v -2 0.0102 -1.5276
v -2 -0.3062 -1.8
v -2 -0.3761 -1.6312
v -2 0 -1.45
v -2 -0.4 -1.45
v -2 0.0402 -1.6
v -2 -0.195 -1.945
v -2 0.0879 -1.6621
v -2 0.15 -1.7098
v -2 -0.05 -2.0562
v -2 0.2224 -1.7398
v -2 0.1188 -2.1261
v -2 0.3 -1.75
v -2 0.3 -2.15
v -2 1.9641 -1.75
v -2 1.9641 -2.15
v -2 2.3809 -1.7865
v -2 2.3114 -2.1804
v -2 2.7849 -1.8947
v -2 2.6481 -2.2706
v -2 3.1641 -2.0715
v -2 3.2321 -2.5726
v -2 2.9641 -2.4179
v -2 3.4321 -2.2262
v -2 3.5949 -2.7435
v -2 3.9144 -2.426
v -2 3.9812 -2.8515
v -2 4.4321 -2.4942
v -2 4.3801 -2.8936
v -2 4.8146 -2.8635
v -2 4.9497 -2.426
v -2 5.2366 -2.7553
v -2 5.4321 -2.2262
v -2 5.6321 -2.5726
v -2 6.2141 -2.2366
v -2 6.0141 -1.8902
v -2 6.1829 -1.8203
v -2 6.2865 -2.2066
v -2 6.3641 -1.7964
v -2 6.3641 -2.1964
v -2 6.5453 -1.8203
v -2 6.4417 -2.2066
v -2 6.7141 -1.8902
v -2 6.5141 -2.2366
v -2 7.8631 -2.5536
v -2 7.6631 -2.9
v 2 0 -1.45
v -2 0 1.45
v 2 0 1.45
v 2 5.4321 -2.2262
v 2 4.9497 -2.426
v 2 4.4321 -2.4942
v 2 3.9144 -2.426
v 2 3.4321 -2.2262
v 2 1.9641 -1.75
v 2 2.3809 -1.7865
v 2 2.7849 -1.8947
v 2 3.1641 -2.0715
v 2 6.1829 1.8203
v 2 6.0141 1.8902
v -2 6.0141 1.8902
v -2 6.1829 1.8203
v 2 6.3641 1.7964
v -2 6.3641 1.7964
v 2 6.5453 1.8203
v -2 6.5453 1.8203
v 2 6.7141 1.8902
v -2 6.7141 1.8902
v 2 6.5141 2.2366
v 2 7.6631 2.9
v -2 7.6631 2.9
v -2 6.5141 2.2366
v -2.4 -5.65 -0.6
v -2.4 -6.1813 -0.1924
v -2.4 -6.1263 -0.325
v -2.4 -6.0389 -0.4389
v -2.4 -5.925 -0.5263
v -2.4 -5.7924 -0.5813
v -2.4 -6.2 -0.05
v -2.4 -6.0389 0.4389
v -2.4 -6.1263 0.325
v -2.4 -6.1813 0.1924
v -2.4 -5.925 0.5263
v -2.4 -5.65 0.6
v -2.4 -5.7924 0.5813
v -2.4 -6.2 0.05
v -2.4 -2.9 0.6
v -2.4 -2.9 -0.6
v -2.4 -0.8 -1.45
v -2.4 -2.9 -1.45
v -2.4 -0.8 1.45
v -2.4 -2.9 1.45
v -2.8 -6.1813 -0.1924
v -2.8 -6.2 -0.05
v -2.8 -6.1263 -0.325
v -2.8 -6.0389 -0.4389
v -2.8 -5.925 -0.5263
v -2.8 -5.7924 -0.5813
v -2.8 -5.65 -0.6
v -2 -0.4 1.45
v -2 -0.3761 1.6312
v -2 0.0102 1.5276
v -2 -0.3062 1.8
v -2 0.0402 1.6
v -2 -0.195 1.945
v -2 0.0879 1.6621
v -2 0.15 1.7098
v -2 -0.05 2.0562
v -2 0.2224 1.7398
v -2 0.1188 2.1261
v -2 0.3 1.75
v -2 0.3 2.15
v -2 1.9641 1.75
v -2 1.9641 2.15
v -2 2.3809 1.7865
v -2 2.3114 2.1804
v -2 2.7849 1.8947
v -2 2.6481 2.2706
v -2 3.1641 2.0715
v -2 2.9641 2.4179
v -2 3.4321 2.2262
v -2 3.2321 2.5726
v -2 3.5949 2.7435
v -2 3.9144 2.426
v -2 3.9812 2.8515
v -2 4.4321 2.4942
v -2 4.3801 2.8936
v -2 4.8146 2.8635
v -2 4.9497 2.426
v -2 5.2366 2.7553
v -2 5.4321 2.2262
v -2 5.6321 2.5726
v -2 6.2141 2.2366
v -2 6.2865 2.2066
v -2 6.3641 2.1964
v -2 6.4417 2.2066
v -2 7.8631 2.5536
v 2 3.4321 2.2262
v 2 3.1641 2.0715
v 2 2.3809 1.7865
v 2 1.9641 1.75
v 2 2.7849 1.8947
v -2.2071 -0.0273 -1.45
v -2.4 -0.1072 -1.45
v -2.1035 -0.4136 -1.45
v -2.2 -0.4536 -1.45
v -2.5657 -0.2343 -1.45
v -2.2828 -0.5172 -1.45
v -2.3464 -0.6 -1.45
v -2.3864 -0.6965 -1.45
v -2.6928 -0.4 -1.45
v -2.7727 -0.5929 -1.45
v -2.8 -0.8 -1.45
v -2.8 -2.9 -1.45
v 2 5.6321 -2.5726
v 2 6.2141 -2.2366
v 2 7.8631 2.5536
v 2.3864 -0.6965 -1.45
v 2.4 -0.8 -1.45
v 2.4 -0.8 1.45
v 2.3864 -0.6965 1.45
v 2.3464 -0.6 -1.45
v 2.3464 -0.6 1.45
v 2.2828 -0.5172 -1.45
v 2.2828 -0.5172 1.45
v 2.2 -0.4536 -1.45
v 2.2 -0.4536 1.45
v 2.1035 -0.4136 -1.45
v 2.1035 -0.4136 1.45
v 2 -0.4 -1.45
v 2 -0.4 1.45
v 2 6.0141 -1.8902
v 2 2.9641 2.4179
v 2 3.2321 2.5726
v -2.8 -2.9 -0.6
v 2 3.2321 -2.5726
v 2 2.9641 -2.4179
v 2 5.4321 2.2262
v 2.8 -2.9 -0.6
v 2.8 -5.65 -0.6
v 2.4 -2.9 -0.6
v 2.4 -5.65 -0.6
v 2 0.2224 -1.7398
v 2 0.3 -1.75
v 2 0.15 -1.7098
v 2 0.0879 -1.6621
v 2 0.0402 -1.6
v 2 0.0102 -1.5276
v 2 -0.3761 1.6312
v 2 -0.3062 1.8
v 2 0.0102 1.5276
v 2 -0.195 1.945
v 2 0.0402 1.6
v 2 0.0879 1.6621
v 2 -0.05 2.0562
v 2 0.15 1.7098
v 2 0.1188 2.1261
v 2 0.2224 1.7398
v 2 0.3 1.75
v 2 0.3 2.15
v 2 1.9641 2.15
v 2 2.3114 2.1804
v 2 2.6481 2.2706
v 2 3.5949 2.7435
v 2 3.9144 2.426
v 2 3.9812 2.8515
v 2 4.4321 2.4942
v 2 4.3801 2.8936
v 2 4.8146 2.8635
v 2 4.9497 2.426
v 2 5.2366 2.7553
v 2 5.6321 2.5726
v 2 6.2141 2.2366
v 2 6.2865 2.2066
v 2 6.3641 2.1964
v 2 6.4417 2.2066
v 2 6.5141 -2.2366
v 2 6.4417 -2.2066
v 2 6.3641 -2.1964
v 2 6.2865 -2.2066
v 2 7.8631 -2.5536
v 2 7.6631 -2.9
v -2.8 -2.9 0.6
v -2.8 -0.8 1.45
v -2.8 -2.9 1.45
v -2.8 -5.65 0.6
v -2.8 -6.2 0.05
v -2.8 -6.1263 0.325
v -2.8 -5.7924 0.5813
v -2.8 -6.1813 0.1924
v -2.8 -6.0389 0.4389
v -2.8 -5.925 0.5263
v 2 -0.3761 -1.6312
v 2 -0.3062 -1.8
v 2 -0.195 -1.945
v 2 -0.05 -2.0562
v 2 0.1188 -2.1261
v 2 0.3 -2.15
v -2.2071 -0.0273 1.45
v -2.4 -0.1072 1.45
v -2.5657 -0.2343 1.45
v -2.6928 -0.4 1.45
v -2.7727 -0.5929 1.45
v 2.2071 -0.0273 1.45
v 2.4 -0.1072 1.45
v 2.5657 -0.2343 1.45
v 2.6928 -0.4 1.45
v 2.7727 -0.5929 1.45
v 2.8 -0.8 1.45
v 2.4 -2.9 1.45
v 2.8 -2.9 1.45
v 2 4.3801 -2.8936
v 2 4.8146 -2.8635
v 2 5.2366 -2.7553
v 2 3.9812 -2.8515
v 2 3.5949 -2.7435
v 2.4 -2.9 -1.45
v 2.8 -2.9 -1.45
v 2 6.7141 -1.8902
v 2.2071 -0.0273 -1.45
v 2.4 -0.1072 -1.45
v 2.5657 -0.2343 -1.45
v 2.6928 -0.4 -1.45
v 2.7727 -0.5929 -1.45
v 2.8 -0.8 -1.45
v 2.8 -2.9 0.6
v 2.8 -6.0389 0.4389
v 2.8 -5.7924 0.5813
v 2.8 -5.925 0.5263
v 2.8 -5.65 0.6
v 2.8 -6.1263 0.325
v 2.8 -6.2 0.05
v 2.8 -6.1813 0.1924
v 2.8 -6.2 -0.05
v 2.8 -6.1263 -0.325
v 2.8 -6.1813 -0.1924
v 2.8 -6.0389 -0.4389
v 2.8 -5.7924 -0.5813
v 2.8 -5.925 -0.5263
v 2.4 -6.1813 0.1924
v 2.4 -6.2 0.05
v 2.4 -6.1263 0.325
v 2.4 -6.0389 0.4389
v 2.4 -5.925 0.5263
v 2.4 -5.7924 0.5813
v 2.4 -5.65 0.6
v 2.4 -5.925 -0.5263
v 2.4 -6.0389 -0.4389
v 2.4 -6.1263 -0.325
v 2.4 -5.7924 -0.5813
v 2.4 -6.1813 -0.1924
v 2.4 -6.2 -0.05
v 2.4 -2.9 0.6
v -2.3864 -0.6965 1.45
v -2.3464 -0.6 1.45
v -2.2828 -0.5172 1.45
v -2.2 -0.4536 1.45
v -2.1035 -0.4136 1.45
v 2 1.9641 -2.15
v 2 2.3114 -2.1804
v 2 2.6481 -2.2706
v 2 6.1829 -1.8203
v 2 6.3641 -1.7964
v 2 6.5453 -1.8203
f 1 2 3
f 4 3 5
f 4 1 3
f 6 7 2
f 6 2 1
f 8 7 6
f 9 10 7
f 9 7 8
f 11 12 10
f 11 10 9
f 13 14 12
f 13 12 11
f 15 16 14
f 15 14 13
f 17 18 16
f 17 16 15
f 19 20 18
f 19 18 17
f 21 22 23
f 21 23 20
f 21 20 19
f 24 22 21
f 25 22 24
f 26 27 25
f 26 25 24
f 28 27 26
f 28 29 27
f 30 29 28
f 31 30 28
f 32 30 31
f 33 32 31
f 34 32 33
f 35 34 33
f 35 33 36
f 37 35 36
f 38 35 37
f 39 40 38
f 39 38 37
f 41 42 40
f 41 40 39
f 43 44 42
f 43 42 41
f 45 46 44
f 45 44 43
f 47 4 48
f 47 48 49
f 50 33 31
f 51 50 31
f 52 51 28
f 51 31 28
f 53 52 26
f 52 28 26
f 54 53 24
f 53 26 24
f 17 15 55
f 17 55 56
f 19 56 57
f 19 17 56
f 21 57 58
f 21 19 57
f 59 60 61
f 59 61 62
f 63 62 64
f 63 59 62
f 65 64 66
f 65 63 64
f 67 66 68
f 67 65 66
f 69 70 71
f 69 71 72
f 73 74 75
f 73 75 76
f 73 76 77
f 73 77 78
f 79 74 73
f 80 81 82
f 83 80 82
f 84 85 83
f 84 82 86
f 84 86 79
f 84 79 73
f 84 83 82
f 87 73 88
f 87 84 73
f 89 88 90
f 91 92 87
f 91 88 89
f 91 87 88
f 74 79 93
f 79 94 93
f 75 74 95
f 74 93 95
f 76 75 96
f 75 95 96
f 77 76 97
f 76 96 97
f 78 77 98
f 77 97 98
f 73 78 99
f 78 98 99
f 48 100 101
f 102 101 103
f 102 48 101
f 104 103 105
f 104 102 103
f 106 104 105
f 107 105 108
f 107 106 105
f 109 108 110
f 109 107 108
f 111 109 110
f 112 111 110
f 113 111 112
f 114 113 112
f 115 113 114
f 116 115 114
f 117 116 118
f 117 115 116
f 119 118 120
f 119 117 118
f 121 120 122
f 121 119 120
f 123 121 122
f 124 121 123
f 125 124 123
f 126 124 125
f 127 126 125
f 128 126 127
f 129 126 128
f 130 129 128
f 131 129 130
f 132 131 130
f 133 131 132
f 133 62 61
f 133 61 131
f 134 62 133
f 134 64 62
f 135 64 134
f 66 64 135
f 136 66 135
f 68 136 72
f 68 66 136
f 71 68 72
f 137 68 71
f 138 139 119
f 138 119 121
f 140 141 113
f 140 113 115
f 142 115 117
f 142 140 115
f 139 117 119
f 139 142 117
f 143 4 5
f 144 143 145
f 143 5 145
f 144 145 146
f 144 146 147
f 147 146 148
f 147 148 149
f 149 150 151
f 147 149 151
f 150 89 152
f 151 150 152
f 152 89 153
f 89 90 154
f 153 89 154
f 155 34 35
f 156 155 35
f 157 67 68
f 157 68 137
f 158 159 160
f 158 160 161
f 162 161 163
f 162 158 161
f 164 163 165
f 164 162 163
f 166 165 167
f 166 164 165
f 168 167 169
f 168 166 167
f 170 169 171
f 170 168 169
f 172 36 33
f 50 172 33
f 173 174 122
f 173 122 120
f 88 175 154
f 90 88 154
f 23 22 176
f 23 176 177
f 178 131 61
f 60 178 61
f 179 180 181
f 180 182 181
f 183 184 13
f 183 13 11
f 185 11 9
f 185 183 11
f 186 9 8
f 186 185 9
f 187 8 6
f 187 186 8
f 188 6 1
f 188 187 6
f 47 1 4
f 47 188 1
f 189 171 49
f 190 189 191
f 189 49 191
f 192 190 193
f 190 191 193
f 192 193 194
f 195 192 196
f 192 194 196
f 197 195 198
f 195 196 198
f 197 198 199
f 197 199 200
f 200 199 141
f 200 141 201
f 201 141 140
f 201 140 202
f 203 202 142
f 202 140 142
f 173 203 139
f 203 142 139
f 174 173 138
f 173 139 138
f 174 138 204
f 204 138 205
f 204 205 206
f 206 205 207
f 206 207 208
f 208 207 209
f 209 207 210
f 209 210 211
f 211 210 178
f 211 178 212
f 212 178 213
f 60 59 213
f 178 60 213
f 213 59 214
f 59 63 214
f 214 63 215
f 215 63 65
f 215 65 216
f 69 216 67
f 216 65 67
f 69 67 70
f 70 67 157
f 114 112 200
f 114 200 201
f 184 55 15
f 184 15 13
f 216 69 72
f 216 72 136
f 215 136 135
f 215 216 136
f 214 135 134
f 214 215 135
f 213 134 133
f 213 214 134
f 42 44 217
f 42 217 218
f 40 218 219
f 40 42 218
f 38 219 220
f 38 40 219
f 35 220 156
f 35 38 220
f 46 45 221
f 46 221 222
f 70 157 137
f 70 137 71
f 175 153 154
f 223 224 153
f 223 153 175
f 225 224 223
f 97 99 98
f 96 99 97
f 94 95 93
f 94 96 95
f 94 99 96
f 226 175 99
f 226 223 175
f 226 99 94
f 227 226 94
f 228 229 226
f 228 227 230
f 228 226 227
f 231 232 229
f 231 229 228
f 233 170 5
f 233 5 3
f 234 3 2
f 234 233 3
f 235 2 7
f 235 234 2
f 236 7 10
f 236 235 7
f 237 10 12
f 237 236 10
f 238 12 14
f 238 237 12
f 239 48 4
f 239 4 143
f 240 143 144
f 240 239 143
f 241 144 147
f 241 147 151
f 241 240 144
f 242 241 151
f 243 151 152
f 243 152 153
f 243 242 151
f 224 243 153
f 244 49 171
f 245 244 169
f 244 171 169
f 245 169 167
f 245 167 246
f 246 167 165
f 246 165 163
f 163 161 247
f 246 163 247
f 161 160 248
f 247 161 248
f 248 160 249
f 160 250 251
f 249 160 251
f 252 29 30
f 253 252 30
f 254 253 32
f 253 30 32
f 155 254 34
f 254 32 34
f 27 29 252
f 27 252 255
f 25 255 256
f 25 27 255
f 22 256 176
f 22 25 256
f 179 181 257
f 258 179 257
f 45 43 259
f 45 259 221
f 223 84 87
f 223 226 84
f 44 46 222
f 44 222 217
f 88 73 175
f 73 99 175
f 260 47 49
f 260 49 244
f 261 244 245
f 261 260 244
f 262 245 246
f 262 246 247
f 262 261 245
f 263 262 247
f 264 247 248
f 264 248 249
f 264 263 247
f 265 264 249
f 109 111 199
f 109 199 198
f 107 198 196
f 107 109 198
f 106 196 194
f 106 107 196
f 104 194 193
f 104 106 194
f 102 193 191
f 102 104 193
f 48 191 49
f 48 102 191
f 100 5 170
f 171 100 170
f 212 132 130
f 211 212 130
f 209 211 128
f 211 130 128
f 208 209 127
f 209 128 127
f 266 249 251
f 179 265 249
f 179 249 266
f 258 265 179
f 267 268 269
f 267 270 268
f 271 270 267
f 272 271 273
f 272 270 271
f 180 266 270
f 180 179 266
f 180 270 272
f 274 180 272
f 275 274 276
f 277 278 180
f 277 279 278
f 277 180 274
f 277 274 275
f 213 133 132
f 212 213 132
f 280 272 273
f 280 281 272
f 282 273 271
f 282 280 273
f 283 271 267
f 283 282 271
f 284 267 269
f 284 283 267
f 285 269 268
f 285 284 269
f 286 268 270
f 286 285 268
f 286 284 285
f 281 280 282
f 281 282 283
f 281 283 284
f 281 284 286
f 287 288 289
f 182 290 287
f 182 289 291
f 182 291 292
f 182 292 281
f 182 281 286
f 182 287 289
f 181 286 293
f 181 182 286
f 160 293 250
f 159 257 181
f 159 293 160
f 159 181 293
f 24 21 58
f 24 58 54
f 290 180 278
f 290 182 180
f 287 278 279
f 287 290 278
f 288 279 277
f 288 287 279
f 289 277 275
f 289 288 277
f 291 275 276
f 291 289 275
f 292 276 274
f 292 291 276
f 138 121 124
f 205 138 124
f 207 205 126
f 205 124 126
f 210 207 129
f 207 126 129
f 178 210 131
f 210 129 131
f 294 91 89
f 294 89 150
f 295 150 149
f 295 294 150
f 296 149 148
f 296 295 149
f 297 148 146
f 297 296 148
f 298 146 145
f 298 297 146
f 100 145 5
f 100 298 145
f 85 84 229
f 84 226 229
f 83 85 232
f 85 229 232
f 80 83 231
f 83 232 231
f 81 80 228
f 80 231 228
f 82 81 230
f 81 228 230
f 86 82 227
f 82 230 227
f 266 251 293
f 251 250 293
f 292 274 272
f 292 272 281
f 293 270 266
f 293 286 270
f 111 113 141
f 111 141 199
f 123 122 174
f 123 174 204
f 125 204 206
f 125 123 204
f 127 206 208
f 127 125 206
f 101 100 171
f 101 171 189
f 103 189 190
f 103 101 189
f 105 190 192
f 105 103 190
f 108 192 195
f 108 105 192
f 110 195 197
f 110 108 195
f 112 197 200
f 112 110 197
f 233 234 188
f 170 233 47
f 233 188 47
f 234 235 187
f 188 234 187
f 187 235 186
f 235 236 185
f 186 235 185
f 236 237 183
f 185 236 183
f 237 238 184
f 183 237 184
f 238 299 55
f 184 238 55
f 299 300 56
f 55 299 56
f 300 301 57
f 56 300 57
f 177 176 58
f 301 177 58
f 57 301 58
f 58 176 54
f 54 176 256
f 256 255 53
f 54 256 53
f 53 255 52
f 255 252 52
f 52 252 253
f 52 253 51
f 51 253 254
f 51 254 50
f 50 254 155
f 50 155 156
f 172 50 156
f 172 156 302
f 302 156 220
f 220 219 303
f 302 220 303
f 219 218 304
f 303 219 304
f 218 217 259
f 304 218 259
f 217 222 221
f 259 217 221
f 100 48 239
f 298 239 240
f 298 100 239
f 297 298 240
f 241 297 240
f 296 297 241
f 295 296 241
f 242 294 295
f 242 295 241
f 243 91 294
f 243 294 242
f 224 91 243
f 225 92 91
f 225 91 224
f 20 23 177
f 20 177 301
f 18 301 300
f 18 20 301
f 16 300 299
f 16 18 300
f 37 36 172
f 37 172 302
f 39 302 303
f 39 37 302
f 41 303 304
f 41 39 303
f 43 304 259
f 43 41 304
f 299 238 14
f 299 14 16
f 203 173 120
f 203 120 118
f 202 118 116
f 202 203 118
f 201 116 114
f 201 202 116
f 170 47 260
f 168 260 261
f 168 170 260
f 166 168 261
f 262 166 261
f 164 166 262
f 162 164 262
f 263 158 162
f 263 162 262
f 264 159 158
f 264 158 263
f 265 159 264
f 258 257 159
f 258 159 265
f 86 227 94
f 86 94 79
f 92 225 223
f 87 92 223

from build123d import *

# Parameters (mm, degrees)
SKETCH_1_W                         = 4
SKETCH_1_H                         = 3.5
SM_BASE_FLANGE_1_DEPTH             = 0.4
SM_EDGE_FLANGE_1_STRIP_W           = 2.2
SM_EDGE_FLANGE_1_STRIP_H           = 0.4
SM_EDGE_FLANGE_1_STRIP_CUT_DEPTH   = 4
SM_EDGE_FLANGE_1_STRIP_2_W         = 2.2
SM_EDGE_FLANGE_1_STRIP_2_H         = 0.4
SM_EDGE_FLANGE_1_STRIP_CUT_2_DEPTH = 4
SM_EDGE_FLANGE_1_DEPTH             = 4
SM_EDGE_FLANGE_1_BEND_DEPTH        = 4
SM_EDGE_FLANGE_2_STRIP_CUT_DEPTH   = 4
SM_EDGE_FLANGE_2_STRIP_CUT_2_DEPTH = 4
SM_EDGE_FLANGE_2_DEPTH             = 4
SM_EDGE_FLANGE_2_BEND_DEPTH        = 4
SM_START                           = -2
SM_EDGE_FLANGE_3_DEPTH             = 4
SM_EDGE_FLANGE_3_2_DEPTH           = 4
SM_EDGE_FLANGE_4_STRIP_CUT_DEPTH   = 4
SM_EDGE_FLANGE_4_STRIP_CUT_2_DEPTH = 4
SM_EDGE_FLANGE_4_DEPTH             = 4
SM_EDGE_FLANGE_4_BEND_DEPTH        = 4
SM_EDGE_FLANGE_5_DEPTH             = 2.9
SM_EDGE_FLANGE_5_BEND_DEPTH        = 2.9
CUT_EXTRUDE_1_DEPTH                = 10
CUT_EXTRUDE_1_DEPTH_BACK           = 10
SKETCH_36_W                        = 1.707463823
SKETCH_36_H                        = 4.810050527
SKETCH_36_W_2                      = 1.878862713
FILLET_1_R                         = 0.55


# Read off the part's stored shape, not the designer's step: Ребро-кромка3
# Sheet-metal steps are written as plain solids
with BuildPart() as part:
    # Sketch 1 → Базовая кромка1 (new body)
    with BuildSketch(Plane(origin=(0, 0, 0), x_dir=(1, 0, 0), z_dir=(0, 1, 0))):
        Rectangle(SKETCH_1_W, SKETCH_1_H)
    extrude(amount=-SM_BASE_FLANGE_1_DEPTH)

    # Ребро-кромка1 strip (across the edge) → Ребро-кромка1 strip cut (cut)
    with BuildSketch(Plane(origin=(-2, 0, 1.75), x_dir=(0, 0, -1), z_dir=(1, 0, 0))):
        with Locations((-0.8, -0.2)):
            Rectangle(SM_EDGE_FLANGE_1_STRIP_W, SM_EDGE_FLANGE_1_STRIP_H)
    extrude(amount=SM_EDGE_FLANGE_1_STRIP_CUT_DEPTH, mode=Mode.SUBTRACT)

    # Ребро-кромка1 strip 2 (across the edge) → Ребро-кромка1 strip cut 2 (cut)
    with BuildSketch(Plane(origin=(2, 0, -1.75), x_dir=(0, 0, 1), z_dir=(-1, 0, 0))):
        with Locations((-0.8, -0.2)):
            Rectangle(SM_EDGE_FLANGE_1_STRIP_2_W, SM_EDGE_FLANGE_1_STRIP_2_H)
    extrude(amount=SM_EDGE_FLANGE_1_STRIP_CUT_2_DEPTH, mode=Mode.SUBTRACT)

    # Ребро-кромка1 section (across the edge) → Ребро-кромка1 (add)
    with BuildSketch(Plane(origin=(-2, 0, 1.75), x_dir=(0, 0, -1), z_dir=(1, 0, 0))):
        with BuildLine():
            Line((-0.4, 0.3), (-0.4, 2.5))
            Line((-0.4, 2.5), (0, 2.5))
            Line((0, 2.5), (0, 0.3))
            ThreePointArc((0, 0.3), (0.087867966, 0.087867966), (0.3, 0))
            Line((0.3, 0), (0.3, -0.4))
            ThreePointArc((0.3, -0.4), (-0.194974747, -0.194974747), (-0.4, 0.3))
        make_face()
    extrude(amount=SM_EDGE_FLANGE_1_DEPTH)

    # Ребро-кромка1 section 2 (across the edge) → Ребро-кромка1 bend (add)
    with BuildSketch(Plane(origin=(2, 0, -1.75), x_dir=(0, 0, 1), z_dir=(-1, 0, 0))):
        with BuildLine():
            Line((-0.4, 0.3), (-0.4, 2.5))
            Line((-0.4, 2.5), (0, 2.5))
            Line((0, 2.5), (0, 0.3))
            ThreePointArc((0, 0.3), (0.087867966, 0.087867966), (0.3, 0))
            Line((0.3, 0), (0.3, -0.4))
            ThreePointArc((0.3, -0.4), (-0.194974747, -0.194974747), (-0.4, 0.3))
        make_face()
    extrude(amount=SM_EDGE_FLANGE_1_BEND_DEPTH)

    # Ребро-кромка2 strip (across the edge) → Ребро-кромка2 strip cut (cut)
    with BuildSketch(Plane(origin=(2, 2.5, 2.15), x_dir=(0, -0.49999999999999795, 0.8660254037844398), z_dir=(-1, 0, 0))):
        Polygon((-2.878460969, 4.185640646), (-0.078460969, -0.664101615), (0.267949192, -0.464101615), (-2.532050808, 4.385640646), align=None)
    extrude(amount=SM_EDGE_FLANGE_2_STRIP_CUT_DEPTH, mode=Mode.SUBTRACT)

    # Ребро-кромка2 strip 2 (across the edge) → Ребро-кромка2 strip cut 2 (cut)
    with BuildSketch(Plane(origin=(-2, 2.5, -2.15), x_dir=(0, -0.49999999999999495, -0.8660254037844416), z_dir=(1, 0, 0))):
        Polygon((-2.878460969, 4.185640646), (-0.078460969, -0.664101615), (0.267949192, -0.464101615), (-2.532050808, 4.385640646), align=None)
    extrude(amount=SM_EDGE_FLANGE_2_STRIP_CUT_2_DEPTH, mode=Mode.SUBTRACT)

    # Ребро-кромка2 section (across the edge) → Ребро-кромка2 (add)
    with BuildSketch(Plane(origin=(2, 2.5, 2.15), x_dir=(0, -0.49999999999999795, 0.8660254037844398), z_dir=(-1, 0, 0))):
        with BuildLine():
            Line((-0.4, 0.535898385), (-0.4, 2))
            Line((-0.4, 2), (0, 2))
            Line((0, 2), (0, 0.535898385))
            ThreePointArc((0, 0.535898385), (0.068148347, 0.018260295), (0.267949192, -0.464101615))
            Line((0.267949192, -0.464101615), (-0.078460969, -0.664101615))
            ThreePointArc((-0.078460969, -0.664101615), (-0.318221983, -0.085267323), (-0.4, 0.535898385))
        make_face()
    extrude(amount=SM_EDGE_FLANGE_2_DEPTH)

    # Ребро-кромка2 section 2 (across the edge) → Ребро-кромка2 bend (add)
    with BuildSketch(Plane(origin=(-2, 2.5, -2.15), x_dir=(0, -0.49999999999999495, -0.8660254037844416), z_dir=(1, 0, 0))):
        with BuildLine():
            Line((-0.4, 0.535898385), (-0.4, 2))
            Line((-0.4, 2), (0, 2))
            Line((0, 2), (0, 0.535898385))
            ThreePointArc((0, 0.535898385), (0.068148347, 0.018260295), (0.267949192, -0.464101615))
            Line((0.267949192, -0.464101615), (-0.078460969, -0.664101615))
            ThreePointArc((-0.078460969, -0.664101615), (-0.318221983, -0.085267323), (-0.4, 0.535898385))
        make_face()
    extrude(amount=SM_EDGE_FLANGE_2_BEND_DEPTH)

    # Ребро-кромка3 outline → Ребро-кромка3 (cut)
    with BuildSketch(Plane.YZ.offset(SM_START)):
        with BuildLine():
            ThreePointArc((3.232050808, 2.572649731), (3.785814556, 2.80554739), (4.380068552, 2.893625747))
            Line((4.380068552, 2.893625747), (4.232050808, 3.15))
            Line((4.232050808, 3.15), (3.232050808, 2.572649731))
        make_face()
        with BuildLine():
            Line((4.232050808, -3.15), (4.380068552, -2.893625747))
            ThreePointArc((4.380068552, -2.893625747), (3.785814556, -2.80554739), (3.232050808, -2.572649731))
            Line((3.232050808, -2.572649731), (4.232050808, -3.15))
        make_face()
    extrude(amount=SM_EDGE_FLANGE_3_DEPTH, mode=Mode.SUBTRACT)

    # Sm Edge Flange 3 2 outline → Sm Edge Flange 3 2 (add)
    with BuildSketch(Plane.YZ.offset(SM_START)):
        with BuildLine():
            Line((6.364101615, 2.15), (5.632050808, 2.572649731))
            ThreePointArc((5.632050808, 2.572649731), (5.028073111, 2.819002177), (4.380068552, 2.893625747))
            Line((4.380068552, 2.893625747), (4.432050808, 2.803589838))
            Line((4.432050808, 2.803589838), (3.432050808, 2.226239569))
            ThreePointArc((3.432050808, 2.226239569), (4.432050808, 2.494188762), (5.432050808, 2.226239569))
            Line((5.432050808, 2.226239569), (6.164101615, 1.803589838))
            Line((6.164101615, 1.803589838), (6.364101615, 2.15))
        make_face()
        with BuildLine():
            ThreePointArc((4.380068552, -2.893625747), (5.028073111, -2.819002177), (5.632050808, -2.572649731))
            Line((5.632050808, -2.572649731), (6.364101615, -2.15))
            Line((6.364101615, -2.15), (6.164101615, -1.803589838))
            Line((6.164101615, -1.803589838), (5.432050808, -2.226239569))
            ThreePointArc((5.432050808, -2.226239569), (4.432050808, -2.494188762), (3.432050808, -2.226239569))
            Line((3.432050808, -2.226239569), (4.432050808, -2.803589838))
            Line((4.432050808, -2.803589838), (4.380068552, -2.893625747))
        make_face()
    extrude(amount=SM_EDGE_FLANGE_3_2_DEPTH)

    # Ребро-кромка4 strip (across the edge) → Ребро-кромка4 strip cut (cut)
    with BuildSketch(Plane(origin=(2, 6.364101615, 2.15), x_dir=(0, -0.4999999999999979, 0.8660254037844399), z_dir=(-1, 0, 0))):
        Polygon((-1.955255888, 0.666987298), (-0.05, -0.433012702), (0.15, -0.08660254), (-1.755255888, 1.01339746), align=None)
    extrude(amount=SM_EDGE_FLANGE_4_STRIP_CUT_DEPTH, mode=Mode.SUBTRACT)

    # Ребро-кромка4 strip 2 (across the edge) → Ребро-кромка4 strip cut 2 (cut)
    with BuildSketch(Plane(origin=(-2, 6.364101615, -2.15), x_dir=(0, -0.4999999999999948, -0.8660254037844417), z_dir=(1, 0, 0))):
        Polygon((-1.955255888, 0.666987298), (-0.05, -0.433012702), (0.15, -0.08660254), (-1.755255888, 1.01339746), align=None)
    extrude(amount=SM_EDGE_FLANGE_4_STRIP_CUT_2_DEPTH, mode=Mode.SUBTRACT)

    # Ребро-кромка4 section (across the edge) → Ребро-кромка4 (add)
    with BuildSketch(Plane(origin=(2, 6.364101615, 2.15), x_dir=(0, -0.4999999999999979, 0.8660254037844399), z_dir=(-1, 0, 0))):
        with BuildLine():
            Line((-0.4, 0.173205081), (-0.4, 1.5))
            Line((-0.4, 1.5), (0, 1.5))
            Line((0, 1.5), (0, 0.173205081))
            ThreePointArc((0, 0.173205081), (0.040192379, 0.023205081), (0.15, -0.08660254))
            Line((0.15, -0.08660254), (-0.05, -0.433012702))
            ThreePointArc((-0.05, -0.433012702), (-0.306217783, -0.176794919), (-0.4, 0.173205081))
        make_face()
    extrude(amount=SM_EDGE_FLANGE_4_DEPTH)

    # Ребро-кромка4 section 2 (across the edge) → Ребро-кромка4 bend (add)
    with BuildSketch(Plane(origin=(-2, 6.364101615, -2.15), x_dir=(0, -0.4999999999999948, -0.8660254037844417), z_dir=(1, 0, 0))):
        with BuildLine():
            Line((-0.4, 0.173205081), (-0.4, 1.5))
            Line((-0.4, 1.5), (0, 1.5))
            Line((0, 1.5), (0, 0.173205081))
            ThreePointArc((0, 0.173205081), (0.040192379, 0.023205081), (0.15, -0.08660254))
            Line((0.15, -0.08660254), (-0.05, -0.433012702))
            ThreePointArc((-0.05, -0.433012702), (-0.306217783, -0.176794919), (-0.4, 0.173205081))
        make_face()
    extrude(amount=SM_EDGE_FLANGE_4_BEND_DEPTH)

    # Ребро-кромка5 section (across the edge) → Ребро-кромка5 (add)
    with BuildSketch(Plane(origin=(2.4, -0.4, -1.45), x_dir=(-1, 0, 0), z_dir=(0, 0, 1))):
        with BuildLine():
            Line((-0.4, 0.4), (-0.4, 5.8))
            Line((-0.4, 5.8), (0, 5.8))
            Line((0, 5.8), (0, 0.4))
            ThreePointArc((0, 0.4), (0.117157288, 0.117157288), (0.4, 0))
            Line((0.4, 0), (0.4, -0.4))
            ThreePointArc((0.4, -0.4), (-0.165685425, -0.165685425), (-0.4, 0.4))
        make_face()
    extrude(amount=SM_EDGE_FLANGE_5_DEPTH)

    # Ребро-кромка5 section 2 (across the edge) → Ребро-кромка5 bend (add)
    with BuildSketch(Plane(origin=(-2.4, -0.4, 1.45), x_dir=(1, 0, 0), z_dir=(0, 0, -1))):
        with BuildLine():
            Line((-0.4, 0.4), (-0.4, 5.8))
            Line((-0.4, 5.8), (0, 5.8))
            Line((0, 5.8), (0, 0.4))
            ThreePointArc((0, 0.4), (0.117157288, 0.117157288), (0.4, 0))
            Line((0.4, 0), (0.4, -0.4))
            ThreePointArc((0.4, -0.4), (-0.165685425, -0.165685425), (-0.4, 0.4))
        make_face()
    extrude(amount=SM_EDGE_FLANGE_5_BEND_DEPTH)

    # Эскиз36 → Вырез-Вытянуть1 (cut, two sides: drawn at the far end of the back side and taken through both)
    with BuildSketch(Plane(origin=(0, 0, 0), x_dir=(0, 0, -1), z_dir=(1, 0, 0)).offset(-CUT_EXTRUDE_1_DEPTH_BACK)):
        with Locations((1.453731912, -5.305025264)):
            Rectangle(SKETCH_36_W, SKETCH_36_H)
        with Locations((-1.539431357, -5.305025264)):
            Rectangle(SKETCH_36_W_2, SKETCH_36_H)
    extrude(amount=CUT_EXTRUDE_1_DEPTH + CUT_EXTRUDE_1_DEPTH_BACK, mode=Mode.SUBTRACT)

    # Скругление1
    fillet_1_edges = [part.edges().sort_by_distance(p)[0] for p in [
        (-2.6, -6.2, -0.6),
        (2.6, -6.2, -0.6),
        (-2.6, -6.2, 0.6),
        (2.6, -6.2, 0.6),
    ]]
    fillet(fillet_1_edges, radius=FILLET_1_R)


solid = part.part
